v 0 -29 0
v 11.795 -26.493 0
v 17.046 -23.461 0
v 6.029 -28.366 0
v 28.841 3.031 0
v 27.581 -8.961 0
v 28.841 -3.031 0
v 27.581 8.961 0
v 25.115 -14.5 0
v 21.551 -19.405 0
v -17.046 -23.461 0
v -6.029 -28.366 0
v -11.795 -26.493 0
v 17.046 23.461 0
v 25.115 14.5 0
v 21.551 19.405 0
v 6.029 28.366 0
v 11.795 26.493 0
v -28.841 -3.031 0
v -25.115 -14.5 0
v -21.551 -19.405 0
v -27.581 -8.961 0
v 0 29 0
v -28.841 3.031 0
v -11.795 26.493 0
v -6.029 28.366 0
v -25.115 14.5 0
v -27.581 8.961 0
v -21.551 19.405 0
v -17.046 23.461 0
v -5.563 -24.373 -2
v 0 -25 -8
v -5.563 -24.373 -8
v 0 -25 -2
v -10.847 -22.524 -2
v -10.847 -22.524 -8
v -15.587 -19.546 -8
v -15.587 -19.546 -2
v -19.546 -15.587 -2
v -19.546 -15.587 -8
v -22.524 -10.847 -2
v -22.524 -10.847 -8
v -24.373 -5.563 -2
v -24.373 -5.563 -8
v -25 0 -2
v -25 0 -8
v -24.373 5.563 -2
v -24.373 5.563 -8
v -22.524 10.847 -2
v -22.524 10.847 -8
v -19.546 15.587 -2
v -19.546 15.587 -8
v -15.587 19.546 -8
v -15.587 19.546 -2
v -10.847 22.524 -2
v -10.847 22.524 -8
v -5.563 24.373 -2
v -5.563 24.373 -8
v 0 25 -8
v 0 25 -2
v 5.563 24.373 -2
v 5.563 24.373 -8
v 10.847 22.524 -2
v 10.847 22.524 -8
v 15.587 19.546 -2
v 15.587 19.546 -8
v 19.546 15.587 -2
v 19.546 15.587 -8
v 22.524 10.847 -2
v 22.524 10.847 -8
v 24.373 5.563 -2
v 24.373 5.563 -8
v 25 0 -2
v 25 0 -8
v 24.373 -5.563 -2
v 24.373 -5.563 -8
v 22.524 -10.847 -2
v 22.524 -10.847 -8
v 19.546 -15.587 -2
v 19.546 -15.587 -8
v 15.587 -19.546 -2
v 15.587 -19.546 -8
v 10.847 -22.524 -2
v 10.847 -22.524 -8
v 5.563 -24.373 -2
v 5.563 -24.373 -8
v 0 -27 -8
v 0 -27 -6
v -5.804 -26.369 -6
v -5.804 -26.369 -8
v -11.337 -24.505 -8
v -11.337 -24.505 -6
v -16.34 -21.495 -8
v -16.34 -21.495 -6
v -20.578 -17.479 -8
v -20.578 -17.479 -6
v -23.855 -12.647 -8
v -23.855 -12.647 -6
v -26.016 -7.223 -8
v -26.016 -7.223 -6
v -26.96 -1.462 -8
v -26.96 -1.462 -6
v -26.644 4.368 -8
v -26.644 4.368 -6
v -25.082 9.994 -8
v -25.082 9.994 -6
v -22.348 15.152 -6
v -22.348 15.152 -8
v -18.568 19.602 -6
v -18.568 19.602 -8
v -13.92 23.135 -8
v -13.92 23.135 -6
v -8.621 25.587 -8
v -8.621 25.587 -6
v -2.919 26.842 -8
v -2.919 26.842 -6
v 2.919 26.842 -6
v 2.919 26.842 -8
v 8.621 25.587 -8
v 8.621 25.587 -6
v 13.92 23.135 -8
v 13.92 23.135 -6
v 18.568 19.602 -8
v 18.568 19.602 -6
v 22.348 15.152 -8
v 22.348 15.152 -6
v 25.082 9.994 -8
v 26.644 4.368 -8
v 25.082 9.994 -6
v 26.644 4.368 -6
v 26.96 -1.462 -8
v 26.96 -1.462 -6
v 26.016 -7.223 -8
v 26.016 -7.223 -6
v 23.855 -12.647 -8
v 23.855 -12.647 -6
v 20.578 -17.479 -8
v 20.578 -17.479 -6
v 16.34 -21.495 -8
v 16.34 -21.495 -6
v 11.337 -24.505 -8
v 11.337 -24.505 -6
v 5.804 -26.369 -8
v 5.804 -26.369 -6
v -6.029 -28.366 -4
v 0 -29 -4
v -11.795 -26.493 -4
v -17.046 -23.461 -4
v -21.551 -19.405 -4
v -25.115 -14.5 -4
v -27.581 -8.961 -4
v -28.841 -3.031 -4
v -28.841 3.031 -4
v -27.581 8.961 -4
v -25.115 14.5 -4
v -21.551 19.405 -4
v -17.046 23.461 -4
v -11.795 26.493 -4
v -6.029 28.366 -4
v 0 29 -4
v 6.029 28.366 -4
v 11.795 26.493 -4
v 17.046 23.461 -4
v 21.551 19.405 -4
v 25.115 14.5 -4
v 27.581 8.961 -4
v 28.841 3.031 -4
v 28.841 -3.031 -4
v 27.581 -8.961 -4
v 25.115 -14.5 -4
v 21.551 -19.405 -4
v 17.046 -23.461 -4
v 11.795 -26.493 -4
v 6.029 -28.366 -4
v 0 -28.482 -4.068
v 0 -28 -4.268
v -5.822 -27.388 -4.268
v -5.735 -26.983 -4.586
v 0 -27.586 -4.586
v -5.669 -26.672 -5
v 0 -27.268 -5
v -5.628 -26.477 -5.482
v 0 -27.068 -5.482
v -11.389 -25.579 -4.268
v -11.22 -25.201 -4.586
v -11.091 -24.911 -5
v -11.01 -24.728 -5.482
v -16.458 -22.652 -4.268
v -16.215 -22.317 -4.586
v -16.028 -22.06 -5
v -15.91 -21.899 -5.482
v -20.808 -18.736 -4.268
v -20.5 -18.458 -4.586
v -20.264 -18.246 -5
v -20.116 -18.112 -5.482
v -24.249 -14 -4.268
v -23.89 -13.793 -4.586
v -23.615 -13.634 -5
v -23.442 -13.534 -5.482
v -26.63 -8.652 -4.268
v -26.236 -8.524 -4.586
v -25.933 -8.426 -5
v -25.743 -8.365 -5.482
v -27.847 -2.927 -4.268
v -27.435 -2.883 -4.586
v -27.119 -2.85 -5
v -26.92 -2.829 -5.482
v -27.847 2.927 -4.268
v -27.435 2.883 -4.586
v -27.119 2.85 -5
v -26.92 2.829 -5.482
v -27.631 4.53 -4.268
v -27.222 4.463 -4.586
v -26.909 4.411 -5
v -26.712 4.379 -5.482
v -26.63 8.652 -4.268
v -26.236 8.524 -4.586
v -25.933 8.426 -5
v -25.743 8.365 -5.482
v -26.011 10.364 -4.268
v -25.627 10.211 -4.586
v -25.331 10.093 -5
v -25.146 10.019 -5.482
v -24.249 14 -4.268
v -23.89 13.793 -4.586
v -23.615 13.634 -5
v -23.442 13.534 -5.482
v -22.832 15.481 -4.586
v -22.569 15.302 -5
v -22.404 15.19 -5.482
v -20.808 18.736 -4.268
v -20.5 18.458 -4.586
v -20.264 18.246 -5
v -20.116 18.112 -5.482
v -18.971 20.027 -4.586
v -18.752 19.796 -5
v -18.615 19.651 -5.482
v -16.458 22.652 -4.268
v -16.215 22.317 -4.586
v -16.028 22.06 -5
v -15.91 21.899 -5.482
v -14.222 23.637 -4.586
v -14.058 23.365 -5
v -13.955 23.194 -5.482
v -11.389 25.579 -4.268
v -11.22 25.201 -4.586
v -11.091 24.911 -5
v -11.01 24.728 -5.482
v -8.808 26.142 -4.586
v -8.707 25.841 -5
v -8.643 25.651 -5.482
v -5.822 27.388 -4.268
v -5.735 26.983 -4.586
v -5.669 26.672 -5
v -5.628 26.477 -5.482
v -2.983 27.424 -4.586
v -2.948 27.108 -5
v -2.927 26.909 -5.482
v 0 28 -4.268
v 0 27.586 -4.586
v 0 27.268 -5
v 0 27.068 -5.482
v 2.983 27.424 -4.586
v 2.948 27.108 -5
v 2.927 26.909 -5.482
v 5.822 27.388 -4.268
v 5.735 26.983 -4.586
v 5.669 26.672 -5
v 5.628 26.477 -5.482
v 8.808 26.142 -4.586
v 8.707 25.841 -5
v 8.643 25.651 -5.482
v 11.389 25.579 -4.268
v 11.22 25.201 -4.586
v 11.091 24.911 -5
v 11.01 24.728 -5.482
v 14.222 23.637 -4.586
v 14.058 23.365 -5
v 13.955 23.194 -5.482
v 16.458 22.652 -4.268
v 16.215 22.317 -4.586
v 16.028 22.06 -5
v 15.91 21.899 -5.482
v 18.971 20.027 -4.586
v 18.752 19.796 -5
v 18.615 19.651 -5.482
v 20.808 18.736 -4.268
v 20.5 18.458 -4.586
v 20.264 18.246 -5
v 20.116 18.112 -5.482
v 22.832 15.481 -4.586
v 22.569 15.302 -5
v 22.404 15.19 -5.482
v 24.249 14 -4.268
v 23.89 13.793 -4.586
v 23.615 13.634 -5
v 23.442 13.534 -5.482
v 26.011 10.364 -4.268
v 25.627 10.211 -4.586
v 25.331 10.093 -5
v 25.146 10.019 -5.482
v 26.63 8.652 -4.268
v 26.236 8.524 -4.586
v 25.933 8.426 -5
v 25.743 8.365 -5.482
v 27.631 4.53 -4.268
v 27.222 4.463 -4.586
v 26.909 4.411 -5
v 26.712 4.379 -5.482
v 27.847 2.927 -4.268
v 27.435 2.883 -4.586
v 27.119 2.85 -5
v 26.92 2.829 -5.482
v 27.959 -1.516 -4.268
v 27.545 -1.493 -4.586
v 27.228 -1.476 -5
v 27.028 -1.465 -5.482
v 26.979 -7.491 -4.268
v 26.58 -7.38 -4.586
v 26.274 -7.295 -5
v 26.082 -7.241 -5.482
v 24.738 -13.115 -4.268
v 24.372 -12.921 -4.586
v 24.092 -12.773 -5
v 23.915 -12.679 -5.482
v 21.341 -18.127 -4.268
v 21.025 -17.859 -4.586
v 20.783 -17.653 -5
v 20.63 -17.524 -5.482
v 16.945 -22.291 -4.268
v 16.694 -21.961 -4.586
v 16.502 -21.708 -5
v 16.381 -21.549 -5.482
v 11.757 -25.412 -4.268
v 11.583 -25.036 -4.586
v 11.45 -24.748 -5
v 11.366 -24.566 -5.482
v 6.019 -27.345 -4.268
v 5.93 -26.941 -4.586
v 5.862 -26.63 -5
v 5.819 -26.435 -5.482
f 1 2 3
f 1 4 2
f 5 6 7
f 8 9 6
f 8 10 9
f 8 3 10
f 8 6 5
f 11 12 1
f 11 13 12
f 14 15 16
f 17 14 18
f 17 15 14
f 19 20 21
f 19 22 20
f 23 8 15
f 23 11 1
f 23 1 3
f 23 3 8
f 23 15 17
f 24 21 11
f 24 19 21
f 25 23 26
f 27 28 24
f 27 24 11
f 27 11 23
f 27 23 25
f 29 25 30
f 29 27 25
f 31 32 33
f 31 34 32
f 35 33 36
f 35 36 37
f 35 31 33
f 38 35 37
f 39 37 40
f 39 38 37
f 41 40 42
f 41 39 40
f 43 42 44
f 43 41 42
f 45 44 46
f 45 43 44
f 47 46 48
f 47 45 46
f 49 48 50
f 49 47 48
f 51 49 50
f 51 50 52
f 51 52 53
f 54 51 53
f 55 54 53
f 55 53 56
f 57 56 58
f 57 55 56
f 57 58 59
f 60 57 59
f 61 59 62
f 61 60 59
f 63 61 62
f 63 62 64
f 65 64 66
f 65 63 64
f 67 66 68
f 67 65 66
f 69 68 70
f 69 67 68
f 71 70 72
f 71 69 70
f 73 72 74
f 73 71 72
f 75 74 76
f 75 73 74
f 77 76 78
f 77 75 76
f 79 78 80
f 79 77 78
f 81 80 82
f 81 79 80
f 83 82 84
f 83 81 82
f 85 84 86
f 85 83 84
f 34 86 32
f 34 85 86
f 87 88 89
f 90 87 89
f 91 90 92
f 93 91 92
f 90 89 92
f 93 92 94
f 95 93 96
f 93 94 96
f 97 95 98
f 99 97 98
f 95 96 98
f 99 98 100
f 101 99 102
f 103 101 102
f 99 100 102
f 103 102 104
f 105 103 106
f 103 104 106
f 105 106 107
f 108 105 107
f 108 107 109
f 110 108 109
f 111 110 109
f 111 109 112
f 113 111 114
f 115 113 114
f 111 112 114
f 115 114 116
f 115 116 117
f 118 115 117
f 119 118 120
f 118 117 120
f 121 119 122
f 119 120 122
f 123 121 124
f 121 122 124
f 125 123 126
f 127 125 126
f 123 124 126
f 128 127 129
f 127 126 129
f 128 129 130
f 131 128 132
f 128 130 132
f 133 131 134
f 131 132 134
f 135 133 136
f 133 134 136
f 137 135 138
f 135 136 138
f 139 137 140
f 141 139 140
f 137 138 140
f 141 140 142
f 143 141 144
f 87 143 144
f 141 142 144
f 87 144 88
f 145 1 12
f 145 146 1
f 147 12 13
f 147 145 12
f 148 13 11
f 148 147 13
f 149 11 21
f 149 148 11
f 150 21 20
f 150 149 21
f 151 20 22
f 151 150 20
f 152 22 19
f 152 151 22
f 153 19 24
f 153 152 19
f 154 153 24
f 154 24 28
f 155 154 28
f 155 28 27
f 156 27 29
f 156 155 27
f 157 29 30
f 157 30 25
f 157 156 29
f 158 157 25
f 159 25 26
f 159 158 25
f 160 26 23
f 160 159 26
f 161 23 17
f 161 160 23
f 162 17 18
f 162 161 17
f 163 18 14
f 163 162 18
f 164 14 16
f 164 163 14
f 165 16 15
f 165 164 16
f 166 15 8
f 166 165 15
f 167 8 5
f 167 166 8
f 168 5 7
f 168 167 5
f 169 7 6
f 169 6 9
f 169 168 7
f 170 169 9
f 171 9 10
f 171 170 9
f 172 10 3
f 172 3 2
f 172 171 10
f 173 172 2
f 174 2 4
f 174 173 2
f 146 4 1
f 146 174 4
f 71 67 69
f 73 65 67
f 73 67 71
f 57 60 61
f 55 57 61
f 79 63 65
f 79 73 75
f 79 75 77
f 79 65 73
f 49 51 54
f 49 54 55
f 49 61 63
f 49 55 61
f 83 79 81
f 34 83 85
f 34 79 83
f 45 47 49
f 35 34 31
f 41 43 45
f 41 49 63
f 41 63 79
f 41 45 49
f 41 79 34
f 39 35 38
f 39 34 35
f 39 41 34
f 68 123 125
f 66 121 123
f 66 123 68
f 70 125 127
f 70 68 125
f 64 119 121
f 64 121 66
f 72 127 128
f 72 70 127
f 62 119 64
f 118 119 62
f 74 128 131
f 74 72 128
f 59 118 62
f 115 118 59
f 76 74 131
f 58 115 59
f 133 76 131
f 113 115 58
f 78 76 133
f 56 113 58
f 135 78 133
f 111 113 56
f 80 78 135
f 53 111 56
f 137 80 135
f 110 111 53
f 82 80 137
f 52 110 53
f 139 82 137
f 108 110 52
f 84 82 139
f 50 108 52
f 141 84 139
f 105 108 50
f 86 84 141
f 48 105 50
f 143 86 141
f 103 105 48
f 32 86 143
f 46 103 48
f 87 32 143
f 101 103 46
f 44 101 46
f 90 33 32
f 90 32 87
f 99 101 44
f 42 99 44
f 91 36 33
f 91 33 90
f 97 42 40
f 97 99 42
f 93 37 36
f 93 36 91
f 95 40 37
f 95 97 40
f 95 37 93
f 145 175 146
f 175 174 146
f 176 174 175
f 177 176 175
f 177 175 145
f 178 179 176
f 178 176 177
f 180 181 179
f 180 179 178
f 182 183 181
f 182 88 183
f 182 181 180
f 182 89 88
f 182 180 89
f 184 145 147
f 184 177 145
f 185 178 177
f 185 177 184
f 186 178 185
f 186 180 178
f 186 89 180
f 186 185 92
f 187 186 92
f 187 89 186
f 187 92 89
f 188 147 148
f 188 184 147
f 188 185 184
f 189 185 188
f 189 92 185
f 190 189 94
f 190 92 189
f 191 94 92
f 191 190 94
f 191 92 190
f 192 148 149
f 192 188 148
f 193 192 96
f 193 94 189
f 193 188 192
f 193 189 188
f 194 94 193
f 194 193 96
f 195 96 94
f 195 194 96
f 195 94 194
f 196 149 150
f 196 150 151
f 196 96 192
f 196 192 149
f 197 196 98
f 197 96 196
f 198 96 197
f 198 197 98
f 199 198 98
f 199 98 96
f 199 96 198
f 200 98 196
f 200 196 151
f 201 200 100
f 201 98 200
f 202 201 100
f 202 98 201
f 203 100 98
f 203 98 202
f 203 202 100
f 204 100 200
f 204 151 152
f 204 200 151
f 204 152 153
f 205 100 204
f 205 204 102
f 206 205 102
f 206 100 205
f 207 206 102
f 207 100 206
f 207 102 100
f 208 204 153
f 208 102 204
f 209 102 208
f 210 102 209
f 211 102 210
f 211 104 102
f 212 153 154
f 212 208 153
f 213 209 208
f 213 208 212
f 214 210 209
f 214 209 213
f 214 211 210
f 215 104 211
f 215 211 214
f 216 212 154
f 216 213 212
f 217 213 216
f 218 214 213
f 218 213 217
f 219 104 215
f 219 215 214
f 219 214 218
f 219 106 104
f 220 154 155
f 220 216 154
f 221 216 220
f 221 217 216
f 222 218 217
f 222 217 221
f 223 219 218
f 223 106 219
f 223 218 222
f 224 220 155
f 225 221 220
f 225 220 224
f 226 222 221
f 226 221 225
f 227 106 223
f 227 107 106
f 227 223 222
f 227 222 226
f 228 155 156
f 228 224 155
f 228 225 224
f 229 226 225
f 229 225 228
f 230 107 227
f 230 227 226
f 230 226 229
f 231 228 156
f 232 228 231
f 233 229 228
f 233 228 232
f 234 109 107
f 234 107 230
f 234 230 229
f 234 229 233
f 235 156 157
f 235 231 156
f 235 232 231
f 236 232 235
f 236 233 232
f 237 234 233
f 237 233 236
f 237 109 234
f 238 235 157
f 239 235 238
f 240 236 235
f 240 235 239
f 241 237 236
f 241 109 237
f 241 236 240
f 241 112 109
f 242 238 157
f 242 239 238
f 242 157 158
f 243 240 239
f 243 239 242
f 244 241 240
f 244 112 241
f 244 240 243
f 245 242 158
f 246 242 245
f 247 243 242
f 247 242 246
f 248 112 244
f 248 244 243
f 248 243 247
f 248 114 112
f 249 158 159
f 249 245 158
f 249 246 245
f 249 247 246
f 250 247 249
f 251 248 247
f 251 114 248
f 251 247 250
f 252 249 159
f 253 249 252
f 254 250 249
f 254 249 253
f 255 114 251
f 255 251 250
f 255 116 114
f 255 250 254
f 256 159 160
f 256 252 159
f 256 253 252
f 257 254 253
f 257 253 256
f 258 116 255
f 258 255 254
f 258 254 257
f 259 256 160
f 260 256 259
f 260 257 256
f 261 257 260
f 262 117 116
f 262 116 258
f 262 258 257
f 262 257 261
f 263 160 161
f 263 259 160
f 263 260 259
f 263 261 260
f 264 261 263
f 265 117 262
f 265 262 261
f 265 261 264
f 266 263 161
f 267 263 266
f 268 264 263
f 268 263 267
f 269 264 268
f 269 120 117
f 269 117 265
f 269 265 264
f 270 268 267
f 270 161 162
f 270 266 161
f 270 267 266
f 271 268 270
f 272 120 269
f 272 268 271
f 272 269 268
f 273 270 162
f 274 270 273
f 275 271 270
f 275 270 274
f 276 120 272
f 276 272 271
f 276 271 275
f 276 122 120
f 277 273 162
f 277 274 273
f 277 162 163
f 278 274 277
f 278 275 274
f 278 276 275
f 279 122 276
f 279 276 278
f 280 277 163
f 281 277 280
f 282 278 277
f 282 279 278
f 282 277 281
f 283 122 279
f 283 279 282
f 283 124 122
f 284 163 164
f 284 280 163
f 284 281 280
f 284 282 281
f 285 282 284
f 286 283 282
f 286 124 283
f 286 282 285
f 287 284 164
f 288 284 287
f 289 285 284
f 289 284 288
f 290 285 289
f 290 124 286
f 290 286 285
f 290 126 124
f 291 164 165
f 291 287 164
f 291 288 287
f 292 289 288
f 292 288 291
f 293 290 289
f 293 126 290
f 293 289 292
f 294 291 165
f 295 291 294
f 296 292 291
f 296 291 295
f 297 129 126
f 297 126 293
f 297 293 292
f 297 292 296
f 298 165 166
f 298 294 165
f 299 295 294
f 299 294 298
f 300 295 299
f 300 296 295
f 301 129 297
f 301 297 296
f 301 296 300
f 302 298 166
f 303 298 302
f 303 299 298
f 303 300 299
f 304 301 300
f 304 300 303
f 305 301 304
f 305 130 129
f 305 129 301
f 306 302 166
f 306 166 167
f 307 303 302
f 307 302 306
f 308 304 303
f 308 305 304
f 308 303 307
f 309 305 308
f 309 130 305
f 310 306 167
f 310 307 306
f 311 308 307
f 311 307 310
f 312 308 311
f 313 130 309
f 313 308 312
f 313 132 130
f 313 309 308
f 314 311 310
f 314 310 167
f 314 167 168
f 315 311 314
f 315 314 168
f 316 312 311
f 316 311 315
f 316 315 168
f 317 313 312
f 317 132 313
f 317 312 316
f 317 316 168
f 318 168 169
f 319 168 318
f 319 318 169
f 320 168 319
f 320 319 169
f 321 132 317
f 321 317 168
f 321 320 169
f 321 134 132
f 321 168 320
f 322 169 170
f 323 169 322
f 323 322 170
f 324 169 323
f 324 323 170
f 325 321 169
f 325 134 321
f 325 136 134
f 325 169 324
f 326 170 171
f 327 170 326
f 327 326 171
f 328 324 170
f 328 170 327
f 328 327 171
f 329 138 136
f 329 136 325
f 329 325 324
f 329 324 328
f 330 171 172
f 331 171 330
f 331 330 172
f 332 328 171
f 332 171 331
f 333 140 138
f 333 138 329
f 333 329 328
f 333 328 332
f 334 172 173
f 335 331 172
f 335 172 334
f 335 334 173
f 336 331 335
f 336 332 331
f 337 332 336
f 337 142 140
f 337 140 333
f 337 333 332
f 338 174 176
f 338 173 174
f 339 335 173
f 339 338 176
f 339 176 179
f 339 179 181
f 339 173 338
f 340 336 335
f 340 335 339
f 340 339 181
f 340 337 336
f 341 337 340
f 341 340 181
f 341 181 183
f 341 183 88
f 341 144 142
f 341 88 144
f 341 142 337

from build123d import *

# Parameters (mm, degrees)
F0_W   = 25
F0_H   = 2
F0_W_2 = 2
F0_H_2 = 4
F2_R   = 1.99999


# Not quite as in the source:
# - a fillet or chamfer is up to 0.001 mm smaller than in the source, because OpenCascade refuses the exact size


with BuildPart() as f1:
    # F0 (on Right) → F1 (revolve)
    with BuildSketch(Plane.YZ):
        with Locations((-12.5, -1)):
            Rectangle(F0_W, F0_H)
        Polygon((-27, -4), (-25, -4), (-25, -2), (-25, 0), (-29, 0), (-29, -4), align=None)
        with Locations((-26, -6)):
            Rectangle(F0_W_2, F0_H_2)
    revolve(axis=Axis((0, 0, -1), (0, 0, -1)))

    # F2 (radius 2 in the source; OpenCascade refuses exactly that, so slightly less here)
    f2_edges = [f1.edges().sort_by_distance(p)[0] for p in [
        (0, 27, -4),
    ]]
    fillet(f2_edges, radius=F2_R)


solid = f1.part
